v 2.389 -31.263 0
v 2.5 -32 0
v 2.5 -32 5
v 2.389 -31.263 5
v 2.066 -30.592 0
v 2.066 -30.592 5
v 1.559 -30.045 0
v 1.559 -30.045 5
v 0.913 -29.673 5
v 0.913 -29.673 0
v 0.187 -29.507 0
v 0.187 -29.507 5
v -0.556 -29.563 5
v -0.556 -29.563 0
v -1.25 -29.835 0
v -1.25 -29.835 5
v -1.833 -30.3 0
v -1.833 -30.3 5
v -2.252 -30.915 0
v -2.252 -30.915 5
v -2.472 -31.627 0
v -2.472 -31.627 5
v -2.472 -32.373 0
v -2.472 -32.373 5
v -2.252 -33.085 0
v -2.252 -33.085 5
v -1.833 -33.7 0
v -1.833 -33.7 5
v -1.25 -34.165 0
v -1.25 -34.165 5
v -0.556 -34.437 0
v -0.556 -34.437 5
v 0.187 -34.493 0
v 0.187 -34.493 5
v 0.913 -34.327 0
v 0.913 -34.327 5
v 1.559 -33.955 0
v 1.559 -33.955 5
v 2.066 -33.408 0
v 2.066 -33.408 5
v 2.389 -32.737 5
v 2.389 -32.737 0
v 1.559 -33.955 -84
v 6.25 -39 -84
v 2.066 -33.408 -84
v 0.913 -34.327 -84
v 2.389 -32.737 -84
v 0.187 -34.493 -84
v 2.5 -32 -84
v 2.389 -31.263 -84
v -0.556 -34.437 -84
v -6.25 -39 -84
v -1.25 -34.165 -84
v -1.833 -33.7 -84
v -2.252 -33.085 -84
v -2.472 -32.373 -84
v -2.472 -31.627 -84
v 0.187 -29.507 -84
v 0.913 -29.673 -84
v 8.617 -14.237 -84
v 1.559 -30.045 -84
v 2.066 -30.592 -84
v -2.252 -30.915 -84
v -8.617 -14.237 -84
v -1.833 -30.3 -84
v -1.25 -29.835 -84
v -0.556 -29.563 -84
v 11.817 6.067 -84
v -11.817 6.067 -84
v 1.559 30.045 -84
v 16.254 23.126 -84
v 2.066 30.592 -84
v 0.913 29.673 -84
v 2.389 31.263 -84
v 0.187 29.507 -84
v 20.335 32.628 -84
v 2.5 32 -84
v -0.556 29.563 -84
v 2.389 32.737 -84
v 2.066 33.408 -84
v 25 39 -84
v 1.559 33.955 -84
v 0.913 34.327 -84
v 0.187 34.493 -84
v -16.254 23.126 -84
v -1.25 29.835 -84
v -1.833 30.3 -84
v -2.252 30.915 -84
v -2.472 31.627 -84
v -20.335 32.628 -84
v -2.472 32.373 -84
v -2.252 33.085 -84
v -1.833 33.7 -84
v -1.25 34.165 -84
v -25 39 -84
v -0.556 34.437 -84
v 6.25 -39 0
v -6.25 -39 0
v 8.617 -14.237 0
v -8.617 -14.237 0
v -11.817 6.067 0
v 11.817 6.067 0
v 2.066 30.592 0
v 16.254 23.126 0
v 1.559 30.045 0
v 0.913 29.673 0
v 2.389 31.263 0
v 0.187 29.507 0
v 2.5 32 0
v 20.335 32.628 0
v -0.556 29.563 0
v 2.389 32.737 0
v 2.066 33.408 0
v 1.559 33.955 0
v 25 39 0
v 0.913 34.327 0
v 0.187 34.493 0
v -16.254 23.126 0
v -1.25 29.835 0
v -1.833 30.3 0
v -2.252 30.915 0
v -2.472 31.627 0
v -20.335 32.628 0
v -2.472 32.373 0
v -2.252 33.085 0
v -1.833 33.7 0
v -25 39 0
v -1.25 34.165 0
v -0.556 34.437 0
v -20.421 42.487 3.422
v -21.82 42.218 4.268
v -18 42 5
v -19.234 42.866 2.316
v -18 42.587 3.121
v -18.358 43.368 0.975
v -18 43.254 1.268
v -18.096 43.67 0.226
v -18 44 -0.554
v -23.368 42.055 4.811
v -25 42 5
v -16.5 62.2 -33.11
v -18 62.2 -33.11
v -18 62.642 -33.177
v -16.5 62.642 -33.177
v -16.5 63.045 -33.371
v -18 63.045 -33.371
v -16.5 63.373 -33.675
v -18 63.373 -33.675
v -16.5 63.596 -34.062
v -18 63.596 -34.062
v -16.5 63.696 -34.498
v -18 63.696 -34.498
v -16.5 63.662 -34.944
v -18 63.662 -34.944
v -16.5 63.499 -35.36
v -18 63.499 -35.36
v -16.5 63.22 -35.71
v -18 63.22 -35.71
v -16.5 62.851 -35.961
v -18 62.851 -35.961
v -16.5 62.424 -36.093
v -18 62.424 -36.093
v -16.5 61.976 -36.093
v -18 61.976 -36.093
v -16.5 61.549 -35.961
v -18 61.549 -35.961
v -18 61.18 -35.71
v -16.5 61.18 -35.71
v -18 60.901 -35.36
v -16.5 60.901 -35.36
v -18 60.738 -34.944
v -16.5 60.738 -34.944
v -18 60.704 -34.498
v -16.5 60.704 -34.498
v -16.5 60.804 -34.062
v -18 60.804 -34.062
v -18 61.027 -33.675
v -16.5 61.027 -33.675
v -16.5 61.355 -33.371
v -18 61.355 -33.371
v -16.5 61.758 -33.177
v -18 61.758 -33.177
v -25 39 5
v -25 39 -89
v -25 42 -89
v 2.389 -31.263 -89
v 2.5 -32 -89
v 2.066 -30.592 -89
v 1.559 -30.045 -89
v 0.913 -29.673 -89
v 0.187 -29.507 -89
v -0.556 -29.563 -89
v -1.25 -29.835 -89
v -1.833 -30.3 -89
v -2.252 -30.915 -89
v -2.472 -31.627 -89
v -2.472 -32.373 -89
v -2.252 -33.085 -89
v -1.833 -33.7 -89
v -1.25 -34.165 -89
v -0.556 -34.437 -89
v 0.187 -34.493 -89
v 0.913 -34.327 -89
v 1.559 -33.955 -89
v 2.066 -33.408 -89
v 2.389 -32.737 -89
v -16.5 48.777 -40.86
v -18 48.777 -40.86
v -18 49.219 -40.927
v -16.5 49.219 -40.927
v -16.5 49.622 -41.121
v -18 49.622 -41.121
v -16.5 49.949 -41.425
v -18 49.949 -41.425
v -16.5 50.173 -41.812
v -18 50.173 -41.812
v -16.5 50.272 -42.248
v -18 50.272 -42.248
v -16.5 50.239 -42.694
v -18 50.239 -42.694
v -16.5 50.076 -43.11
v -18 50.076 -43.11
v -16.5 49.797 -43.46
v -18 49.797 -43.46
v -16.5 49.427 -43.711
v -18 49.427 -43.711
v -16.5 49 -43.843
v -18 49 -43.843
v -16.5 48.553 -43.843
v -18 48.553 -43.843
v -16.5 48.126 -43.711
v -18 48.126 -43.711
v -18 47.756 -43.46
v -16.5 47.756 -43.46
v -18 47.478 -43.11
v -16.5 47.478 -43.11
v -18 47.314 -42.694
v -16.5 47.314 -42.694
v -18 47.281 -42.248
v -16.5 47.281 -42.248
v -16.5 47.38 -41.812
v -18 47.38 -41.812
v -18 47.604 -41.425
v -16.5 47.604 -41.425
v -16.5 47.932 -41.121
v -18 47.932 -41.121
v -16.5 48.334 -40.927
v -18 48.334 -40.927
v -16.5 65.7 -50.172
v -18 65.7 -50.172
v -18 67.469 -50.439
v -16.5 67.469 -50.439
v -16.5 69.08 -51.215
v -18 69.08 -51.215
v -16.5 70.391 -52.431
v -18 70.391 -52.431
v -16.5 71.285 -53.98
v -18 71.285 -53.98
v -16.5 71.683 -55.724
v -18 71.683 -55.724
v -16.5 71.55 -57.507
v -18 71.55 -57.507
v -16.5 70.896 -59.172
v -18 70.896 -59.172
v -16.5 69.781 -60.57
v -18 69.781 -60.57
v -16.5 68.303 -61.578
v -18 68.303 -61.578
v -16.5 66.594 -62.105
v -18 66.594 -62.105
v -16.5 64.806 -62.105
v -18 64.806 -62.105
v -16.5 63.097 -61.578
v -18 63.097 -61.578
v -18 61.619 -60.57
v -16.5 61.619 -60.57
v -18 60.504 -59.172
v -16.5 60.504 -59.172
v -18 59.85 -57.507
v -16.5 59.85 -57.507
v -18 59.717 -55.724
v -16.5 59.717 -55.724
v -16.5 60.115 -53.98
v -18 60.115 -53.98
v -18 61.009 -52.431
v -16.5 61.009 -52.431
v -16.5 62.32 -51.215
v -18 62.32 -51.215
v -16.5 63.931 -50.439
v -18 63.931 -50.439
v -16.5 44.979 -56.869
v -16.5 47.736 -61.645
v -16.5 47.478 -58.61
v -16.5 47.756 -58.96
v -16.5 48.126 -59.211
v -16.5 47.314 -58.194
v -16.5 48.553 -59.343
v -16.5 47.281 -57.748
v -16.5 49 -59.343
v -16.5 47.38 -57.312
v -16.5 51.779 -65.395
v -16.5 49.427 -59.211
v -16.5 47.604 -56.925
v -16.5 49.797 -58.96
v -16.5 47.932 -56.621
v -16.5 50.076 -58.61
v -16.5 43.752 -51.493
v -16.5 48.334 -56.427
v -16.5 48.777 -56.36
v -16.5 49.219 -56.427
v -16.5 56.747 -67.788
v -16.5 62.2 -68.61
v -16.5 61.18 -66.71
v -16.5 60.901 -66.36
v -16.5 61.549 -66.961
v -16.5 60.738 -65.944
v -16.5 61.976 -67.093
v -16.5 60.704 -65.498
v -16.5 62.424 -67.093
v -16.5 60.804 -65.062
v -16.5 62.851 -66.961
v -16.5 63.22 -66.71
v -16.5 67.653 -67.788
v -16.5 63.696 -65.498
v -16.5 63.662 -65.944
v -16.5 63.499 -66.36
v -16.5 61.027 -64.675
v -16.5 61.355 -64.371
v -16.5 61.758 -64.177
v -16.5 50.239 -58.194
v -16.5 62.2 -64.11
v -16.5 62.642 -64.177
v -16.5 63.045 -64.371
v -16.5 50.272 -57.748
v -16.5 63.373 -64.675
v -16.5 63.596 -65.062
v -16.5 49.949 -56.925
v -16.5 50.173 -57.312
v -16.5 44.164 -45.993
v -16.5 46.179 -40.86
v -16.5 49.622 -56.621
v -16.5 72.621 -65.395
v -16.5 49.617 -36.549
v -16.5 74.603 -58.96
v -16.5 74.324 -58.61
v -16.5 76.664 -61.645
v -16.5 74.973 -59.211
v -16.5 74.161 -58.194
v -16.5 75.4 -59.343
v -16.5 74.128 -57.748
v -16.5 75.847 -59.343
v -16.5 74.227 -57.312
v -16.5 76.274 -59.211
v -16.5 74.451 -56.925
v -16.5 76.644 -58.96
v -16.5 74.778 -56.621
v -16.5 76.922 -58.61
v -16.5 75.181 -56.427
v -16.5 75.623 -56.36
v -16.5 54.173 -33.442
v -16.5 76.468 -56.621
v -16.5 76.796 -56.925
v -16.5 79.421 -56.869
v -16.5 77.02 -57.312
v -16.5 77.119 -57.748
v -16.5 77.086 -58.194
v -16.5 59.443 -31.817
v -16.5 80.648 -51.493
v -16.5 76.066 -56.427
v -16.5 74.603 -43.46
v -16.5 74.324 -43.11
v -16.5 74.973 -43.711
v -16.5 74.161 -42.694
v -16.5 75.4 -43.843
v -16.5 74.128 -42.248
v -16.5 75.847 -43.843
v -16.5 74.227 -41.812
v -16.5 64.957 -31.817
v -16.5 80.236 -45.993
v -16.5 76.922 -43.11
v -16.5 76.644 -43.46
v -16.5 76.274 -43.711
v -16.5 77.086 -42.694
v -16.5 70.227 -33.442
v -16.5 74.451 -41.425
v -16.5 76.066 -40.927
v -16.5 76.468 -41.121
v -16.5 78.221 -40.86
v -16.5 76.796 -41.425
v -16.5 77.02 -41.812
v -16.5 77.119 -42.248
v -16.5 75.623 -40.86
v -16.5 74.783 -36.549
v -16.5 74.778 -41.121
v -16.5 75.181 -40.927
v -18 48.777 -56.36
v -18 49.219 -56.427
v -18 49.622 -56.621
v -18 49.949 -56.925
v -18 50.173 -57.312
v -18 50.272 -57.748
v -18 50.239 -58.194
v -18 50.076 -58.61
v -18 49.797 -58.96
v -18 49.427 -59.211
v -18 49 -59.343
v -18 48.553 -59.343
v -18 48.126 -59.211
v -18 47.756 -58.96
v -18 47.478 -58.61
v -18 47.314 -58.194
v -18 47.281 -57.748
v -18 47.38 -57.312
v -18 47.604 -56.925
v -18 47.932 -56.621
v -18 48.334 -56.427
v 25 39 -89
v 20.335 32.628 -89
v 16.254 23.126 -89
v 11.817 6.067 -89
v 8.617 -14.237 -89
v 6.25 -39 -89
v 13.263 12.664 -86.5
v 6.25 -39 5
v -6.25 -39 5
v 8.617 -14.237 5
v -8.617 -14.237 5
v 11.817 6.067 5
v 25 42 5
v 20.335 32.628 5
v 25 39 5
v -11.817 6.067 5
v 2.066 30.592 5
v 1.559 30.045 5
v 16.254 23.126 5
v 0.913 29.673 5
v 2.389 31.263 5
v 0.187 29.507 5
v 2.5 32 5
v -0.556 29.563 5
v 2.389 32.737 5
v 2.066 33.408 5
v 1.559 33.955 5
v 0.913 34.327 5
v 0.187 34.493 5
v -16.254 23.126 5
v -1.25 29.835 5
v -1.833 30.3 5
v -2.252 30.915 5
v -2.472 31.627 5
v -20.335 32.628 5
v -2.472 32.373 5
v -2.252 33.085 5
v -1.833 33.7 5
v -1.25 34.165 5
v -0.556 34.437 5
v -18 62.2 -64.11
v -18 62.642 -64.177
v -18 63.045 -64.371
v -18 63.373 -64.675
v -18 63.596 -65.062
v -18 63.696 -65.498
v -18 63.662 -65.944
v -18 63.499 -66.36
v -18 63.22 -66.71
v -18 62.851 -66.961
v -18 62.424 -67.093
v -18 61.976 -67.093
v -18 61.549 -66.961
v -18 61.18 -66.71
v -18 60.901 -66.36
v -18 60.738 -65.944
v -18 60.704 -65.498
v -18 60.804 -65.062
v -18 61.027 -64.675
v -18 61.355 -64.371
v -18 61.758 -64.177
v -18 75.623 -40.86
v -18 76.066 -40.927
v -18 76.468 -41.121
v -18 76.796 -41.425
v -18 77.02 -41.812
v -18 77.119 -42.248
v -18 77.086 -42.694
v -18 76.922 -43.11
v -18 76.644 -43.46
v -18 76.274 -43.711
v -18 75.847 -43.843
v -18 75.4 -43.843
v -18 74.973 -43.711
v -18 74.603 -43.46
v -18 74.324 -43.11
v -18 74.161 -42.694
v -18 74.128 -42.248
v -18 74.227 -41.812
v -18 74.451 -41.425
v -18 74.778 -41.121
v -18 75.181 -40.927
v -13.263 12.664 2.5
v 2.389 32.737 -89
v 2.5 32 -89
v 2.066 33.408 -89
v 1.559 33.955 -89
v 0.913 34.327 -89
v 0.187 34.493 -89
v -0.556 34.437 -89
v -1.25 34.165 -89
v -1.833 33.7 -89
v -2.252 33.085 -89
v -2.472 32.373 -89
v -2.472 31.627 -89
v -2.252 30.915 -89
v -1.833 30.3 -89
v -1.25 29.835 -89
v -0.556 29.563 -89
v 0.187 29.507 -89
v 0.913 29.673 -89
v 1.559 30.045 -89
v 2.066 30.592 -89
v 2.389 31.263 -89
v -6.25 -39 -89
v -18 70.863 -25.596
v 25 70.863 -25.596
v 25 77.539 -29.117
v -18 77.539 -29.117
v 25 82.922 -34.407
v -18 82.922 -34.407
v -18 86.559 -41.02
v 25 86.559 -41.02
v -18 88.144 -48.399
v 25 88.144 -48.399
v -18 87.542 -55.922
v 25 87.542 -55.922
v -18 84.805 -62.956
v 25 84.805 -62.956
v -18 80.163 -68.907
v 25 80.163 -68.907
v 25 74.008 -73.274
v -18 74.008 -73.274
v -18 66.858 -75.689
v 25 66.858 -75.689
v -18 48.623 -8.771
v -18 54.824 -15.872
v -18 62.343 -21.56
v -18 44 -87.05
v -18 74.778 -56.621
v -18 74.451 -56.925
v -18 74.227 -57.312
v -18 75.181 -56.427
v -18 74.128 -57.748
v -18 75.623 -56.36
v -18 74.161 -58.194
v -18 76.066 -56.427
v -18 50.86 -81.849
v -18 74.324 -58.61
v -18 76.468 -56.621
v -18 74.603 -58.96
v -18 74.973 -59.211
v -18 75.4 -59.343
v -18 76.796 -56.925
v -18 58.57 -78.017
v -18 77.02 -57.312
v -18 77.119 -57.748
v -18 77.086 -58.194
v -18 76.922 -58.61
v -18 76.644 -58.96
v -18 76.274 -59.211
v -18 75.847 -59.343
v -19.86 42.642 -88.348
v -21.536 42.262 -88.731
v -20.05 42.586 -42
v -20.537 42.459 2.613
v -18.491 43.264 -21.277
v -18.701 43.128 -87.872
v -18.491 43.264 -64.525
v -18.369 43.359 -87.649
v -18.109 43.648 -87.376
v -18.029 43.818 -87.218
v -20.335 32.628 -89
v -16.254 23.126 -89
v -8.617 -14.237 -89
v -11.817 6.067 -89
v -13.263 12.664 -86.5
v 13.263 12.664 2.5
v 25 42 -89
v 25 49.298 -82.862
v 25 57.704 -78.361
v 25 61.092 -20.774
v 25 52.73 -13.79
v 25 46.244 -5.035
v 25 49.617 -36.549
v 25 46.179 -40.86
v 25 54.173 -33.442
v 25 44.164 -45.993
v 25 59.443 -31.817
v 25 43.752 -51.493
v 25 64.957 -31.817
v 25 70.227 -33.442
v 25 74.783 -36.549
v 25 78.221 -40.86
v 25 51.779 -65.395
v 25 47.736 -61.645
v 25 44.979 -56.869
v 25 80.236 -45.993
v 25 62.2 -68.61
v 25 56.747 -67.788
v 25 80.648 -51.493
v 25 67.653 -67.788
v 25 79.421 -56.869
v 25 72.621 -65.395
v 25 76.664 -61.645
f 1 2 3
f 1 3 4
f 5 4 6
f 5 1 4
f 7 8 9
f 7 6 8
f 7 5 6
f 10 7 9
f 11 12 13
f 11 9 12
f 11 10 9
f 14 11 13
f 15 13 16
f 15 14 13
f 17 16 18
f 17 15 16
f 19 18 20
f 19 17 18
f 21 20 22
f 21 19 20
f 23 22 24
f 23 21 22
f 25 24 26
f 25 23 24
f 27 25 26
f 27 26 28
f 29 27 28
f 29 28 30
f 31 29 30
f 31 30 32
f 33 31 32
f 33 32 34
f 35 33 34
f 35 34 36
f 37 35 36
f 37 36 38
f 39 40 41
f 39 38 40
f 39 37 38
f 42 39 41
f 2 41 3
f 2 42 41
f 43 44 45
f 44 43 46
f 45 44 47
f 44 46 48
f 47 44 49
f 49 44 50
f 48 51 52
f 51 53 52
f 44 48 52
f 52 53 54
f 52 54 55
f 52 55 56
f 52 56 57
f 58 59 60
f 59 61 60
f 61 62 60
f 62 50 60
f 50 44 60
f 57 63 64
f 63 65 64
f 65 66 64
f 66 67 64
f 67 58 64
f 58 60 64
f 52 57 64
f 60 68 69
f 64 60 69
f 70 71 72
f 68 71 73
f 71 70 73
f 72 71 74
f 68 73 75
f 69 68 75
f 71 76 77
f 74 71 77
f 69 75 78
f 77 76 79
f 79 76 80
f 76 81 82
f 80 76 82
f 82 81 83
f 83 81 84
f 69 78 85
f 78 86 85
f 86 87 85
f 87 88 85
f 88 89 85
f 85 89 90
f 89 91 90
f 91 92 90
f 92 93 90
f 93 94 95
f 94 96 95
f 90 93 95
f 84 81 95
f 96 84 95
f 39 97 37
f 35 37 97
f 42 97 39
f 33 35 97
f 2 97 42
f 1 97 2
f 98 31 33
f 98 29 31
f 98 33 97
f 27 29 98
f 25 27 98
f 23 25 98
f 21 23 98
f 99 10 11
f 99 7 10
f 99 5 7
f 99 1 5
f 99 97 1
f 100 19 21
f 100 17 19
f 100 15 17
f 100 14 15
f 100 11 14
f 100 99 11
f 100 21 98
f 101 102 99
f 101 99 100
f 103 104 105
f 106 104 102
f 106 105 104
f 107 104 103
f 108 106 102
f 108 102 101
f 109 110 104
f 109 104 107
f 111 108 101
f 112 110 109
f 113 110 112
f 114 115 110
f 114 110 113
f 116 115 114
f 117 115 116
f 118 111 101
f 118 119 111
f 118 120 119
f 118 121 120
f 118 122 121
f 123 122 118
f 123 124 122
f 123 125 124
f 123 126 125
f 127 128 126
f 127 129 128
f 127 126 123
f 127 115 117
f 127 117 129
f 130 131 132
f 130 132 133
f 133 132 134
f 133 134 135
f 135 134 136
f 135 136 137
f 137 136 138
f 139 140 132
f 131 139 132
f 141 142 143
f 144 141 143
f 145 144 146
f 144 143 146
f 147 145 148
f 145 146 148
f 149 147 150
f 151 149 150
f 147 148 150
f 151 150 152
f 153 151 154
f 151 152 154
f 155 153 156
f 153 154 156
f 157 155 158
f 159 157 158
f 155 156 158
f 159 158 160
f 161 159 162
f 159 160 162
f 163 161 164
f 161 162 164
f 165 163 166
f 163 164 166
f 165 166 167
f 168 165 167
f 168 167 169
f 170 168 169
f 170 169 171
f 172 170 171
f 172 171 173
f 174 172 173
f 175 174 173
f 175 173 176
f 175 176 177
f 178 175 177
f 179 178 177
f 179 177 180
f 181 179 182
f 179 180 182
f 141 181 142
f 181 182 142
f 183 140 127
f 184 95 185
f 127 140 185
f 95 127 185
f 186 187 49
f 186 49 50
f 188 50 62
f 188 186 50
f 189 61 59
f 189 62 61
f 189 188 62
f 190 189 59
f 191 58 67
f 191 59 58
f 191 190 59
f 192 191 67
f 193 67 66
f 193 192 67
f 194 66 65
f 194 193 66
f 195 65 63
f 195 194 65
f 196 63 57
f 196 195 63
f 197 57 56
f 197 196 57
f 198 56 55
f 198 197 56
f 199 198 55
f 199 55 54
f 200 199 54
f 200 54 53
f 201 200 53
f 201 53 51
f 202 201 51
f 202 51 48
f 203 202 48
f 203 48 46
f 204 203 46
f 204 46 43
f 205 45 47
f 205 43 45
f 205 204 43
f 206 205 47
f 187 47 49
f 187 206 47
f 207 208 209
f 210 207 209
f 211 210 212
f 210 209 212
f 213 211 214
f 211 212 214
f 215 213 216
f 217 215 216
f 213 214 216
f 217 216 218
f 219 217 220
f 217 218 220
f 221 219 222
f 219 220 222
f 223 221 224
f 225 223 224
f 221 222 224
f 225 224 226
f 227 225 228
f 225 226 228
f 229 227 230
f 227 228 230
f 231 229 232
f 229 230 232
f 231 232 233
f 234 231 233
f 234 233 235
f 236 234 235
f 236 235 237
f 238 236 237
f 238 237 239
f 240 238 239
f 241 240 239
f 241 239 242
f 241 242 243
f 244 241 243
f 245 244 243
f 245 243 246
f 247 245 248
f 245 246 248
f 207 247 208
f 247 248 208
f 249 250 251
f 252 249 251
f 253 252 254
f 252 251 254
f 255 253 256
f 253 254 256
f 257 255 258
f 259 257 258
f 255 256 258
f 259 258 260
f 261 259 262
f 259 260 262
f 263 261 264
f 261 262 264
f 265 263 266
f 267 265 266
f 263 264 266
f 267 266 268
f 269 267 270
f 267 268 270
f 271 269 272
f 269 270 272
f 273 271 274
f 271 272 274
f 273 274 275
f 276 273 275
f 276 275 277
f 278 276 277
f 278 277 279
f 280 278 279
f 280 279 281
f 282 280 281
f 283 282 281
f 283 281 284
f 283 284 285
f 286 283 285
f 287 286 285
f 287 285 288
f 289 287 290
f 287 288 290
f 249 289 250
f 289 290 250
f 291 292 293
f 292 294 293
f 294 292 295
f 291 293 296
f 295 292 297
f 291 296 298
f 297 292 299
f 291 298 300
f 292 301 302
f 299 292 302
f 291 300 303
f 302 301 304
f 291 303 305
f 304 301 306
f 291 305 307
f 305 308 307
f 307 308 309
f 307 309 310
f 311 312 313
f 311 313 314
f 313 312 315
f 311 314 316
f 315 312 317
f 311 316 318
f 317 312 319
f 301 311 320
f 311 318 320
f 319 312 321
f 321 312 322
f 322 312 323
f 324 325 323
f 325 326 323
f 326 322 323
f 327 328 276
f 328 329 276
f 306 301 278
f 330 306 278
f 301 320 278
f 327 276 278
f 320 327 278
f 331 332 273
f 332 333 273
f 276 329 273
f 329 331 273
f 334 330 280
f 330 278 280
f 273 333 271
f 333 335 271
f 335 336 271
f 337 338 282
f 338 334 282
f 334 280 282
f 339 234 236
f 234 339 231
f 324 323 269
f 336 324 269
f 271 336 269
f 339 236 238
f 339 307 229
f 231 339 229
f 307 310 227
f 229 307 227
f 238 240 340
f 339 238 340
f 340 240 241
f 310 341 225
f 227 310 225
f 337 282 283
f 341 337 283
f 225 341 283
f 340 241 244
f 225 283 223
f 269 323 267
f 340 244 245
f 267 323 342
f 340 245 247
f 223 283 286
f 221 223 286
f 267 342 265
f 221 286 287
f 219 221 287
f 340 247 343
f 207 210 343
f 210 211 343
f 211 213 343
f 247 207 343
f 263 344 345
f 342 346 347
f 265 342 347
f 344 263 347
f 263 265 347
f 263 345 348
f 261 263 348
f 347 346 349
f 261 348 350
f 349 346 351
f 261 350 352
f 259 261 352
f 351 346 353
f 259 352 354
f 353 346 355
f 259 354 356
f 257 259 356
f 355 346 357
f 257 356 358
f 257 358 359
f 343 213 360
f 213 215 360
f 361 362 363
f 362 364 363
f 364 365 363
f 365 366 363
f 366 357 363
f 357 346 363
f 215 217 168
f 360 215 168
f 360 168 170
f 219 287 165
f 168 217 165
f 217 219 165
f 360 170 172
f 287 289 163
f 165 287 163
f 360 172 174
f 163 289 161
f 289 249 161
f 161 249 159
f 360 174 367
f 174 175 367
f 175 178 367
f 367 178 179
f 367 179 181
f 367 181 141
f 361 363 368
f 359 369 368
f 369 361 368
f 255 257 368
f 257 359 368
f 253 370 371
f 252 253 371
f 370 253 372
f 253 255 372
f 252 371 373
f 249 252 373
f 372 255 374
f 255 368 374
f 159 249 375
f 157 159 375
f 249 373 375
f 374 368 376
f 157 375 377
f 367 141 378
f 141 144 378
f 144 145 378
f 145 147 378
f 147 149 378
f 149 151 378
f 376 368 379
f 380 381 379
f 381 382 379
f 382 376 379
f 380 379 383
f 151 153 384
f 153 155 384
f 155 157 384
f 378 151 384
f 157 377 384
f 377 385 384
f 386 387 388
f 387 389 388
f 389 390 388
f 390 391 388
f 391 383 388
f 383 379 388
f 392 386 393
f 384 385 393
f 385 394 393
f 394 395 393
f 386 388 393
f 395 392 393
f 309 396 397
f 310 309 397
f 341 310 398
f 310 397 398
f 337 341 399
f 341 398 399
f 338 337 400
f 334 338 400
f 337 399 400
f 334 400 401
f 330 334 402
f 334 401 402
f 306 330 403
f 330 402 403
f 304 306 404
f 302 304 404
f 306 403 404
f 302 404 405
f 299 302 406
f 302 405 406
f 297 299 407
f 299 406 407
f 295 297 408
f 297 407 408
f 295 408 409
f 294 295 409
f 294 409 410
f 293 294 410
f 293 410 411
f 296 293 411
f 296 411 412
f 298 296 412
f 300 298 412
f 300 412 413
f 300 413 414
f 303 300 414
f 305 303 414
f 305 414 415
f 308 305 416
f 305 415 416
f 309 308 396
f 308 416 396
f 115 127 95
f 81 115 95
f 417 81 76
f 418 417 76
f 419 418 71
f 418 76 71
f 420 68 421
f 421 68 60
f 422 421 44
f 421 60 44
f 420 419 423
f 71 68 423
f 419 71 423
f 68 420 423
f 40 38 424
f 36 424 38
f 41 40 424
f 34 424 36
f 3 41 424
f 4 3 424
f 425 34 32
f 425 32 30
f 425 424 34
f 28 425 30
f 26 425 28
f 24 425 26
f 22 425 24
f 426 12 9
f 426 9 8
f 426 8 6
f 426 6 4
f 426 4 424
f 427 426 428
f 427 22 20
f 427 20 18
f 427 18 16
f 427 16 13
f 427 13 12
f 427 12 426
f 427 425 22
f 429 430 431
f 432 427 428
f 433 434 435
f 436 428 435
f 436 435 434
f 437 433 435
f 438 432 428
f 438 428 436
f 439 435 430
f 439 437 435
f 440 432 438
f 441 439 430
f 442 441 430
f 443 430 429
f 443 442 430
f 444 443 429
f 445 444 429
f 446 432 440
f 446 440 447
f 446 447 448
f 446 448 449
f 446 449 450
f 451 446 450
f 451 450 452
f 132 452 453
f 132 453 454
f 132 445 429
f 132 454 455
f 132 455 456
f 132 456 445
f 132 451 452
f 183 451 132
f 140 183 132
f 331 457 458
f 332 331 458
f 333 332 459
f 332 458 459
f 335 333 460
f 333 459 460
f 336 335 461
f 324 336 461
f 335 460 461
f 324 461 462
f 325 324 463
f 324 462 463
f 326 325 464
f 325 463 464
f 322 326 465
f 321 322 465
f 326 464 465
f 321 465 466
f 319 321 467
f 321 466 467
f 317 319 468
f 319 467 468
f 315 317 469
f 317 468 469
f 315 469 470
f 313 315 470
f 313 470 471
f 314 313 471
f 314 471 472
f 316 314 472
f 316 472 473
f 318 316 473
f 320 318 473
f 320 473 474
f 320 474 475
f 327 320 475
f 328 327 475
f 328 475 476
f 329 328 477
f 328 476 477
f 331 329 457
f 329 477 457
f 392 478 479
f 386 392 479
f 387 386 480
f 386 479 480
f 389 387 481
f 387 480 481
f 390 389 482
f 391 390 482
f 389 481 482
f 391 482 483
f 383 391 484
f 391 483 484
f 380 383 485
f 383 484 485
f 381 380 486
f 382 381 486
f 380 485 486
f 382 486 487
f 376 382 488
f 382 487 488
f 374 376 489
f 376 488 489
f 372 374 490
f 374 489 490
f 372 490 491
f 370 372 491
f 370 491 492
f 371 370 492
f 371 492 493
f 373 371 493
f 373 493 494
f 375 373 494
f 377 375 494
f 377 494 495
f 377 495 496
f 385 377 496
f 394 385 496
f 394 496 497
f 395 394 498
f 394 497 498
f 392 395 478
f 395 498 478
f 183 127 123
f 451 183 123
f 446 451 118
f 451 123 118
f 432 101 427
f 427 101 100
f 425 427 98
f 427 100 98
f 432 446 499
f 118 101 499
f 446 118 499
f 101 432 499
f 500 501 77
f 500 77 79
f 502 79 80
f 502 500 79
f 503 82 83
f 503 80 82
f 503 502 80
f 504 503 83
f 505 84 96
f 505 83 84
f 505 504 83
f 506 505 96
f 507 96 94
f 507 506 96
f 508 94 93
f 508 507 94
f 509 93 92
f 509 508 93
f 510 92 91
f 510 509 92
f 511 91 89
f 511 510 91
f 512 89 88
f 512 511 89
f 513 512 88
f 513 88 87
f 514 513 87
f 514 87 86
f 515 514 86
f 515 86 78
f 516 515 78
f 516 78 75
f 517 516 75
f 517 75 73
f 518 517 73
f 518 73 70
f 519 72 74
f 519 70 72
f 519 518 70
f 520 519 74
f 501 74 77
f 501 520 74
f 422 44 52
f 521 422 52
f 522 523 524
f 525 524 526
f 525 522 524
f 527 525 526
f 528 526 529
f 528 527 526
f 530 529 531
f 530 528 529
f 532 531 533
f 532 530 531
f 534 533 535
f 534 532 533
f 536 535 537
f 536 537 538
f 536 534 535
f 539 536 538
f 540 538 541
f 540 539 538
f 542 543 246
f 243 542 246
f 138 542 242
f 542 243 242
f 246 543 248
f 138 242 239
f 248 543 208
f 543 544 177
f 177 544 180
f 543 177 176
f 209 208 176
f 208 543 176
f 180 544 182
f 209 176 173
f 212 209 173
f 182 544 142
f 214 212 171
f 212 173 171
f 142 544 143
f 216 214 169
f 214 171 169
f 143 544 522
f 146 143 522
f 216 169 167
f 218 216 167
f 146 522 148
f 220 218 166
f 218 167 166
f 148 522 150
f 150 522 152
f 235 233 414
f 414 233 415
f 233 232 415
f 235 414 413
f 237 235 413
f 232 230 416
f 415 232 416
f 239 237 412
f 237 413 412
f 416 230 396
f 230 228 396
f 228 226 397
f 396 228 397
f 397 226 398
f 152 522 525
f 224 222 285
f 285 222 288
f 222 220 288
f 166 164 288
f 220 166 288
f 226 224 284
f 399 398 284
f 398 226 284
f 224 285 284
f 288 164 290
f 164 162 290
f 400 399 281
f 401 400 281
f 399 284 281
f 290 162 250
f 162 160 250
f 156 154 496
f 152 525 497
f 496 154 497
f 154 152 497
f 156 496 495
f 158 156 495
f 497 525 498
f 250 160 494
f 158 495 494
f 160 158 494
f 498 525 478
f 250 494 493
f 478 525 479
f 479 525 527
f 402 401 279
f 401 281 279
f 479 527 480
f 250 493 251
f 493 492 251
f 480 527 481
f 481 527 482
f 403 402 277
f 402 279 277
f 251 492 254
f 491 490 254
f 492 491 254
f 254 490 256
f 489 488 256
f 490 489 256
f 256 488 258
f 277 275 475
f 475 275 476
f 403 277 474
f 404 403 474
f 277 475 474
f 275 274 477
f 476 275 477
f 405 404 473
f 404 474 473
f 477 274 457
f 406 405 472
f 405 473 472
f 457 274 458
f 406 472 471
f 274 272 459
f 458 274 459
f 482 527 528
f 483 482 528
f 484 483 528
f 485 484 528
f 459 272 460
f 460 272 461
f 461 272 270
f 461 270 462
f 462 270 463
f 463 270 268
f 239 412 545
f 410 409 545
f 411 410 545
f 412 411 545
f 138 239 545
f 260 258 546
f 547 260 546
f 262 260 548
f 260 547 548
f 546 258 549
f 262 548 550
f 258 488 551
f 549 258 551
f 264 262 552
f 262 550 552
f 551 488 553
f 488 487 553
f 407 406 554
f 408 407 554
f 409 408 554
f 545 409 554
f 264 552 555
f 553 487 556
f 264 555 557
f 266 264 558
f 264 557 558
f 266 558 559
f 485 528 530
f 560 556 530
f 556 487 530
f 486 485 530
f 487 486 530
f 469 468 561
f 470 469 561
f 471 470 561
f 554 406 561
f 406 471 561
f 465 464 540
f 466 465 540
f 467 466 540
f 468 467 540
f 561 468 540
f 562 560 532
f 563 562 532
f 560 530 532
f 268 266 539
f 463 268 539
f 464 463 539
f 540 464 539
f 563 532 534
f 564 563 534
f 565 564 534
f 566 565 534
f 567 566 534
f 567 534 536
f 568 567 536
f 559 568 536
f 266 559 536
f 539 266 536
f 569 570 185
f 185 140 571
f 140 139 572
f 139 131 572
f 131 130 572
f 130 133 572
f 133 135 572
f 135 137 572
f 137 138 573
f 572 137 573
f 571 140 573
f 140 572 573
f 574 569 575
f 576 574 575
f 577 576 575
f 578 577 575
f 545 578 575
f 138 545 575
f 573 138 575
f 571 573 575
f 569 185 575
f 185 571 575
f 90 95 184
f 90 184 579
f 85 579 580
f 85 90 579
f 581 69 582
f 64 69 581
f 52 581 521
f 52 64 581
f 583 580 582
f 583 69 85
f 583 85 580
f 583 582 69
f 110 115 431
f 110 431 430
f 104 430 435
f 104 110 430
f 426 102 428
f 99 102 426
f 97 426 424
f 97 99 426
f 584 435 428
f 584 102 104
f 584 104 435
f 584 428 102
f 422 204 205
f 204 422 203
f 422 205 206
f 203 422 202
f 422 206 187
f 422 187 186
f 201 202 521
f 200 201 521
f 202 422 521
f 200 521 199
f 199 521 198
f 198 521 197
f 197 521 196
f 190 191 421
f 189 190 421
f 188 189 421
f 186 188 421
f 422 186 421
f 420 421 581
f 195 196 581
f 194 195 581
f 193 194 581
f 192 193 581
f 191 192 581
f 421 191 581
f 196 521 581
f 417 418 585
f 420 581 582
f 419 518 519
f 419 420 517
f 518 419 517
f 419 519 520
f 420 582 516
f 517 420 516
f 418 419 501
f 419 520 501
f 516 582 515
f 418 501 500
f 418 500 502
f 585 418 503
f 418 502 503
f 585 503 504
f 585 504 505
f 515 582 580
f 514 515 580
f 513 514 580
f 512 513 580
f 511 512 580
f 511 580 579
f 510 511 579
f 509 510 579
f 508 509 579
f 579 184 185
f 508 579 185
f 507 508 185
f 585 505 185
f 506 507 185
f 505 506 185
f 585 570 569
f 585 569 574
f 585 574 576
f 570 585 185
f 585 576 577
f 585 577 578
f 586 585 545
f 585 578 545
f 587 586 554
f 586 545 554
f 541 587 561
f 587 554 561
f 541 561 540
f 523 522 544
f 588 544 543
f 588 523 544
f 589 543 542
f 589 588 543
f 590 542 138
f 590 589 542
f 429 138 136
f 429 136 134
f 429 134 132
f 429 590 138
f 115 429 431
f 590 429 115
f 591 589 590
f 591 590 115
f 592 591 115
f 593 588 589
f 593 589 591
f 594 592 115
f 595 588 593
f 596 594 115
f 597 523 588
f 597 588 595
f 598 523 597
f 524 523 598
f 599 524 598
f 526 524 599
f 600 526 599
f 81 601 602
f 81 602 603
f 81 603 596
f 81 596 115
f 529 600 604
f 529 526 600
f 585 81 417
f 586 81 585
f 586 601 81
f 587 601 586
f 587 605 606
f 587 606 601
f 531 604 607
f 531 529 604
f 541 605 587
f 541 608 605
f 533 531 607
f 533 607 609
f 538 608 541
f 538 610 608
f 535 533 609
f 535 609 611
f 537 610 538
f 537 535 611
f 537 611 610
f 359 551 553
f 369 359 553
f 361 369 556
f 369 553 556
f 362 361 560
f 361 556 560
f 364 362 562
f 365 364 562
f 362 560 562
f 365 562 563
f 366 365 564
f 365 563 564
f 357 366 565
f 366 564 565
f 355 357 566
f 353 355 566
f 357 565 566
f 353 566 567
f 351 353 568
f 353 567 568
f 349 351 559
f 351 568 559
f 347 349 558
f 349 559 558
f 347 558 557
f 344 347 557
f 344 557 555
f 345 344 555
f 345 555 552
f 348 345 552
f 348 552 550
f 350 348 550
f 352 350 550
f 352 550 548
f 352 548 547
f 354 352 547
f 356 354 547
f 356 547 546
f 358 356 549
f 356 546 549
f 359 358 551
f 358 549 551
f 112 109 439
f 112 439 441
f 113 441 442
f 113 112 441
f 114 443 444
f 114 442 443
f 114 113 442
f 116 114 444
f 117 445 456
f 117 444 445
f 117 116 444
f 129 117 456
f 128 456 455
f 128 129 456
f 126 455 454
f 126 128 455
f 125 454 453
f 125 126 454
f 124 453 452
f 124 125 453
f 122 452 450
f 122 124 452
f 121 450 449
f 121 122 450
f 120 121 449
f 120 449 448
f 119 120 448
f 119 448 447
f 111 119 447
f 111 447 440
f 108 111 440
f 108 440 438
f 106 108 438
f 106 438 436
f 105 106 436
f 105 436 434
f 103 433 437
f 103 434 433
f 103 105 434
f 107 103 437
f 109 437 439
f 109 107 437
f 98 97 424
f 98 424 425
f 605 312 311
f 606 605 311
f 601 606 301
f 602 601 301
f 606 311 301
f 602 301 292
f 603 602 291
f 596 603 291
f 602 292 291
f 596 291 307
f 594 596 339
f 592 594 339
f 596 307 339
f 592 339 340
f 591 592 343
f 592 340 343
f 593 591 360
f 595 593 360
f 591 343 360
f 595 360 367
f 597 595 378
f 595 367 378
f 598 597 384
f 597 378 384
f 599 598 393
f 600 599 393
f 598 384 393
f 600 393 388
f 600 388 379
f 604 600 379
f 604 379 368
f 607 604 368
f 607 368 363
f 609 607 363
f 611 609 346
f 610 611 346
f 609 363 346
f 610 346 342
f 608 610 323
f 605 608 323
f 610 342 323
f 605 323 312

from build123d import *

# Parameters (mm, degrees)
BOSS_EXTRUDE1_DEPTH      = 5
BOSS_EXTRUDE2_START      = -84
BOSS_EXTRUDE2_DEPTH      = 5
BOSS_EXTRUDE7_DEPTH      = 21
BOSS_EXTRUDE7_DEPTH_BACK = 29
BOSS_EXTRUDE7_START      = 4
SKETCH9_W                = 94
SKETCH9_H                = 3
CUT_EXTRUDE1_DEPTH       = 106.948100654
CUT_EXTRUDE1_DEPTH_BACK  = 106.948100654
SKETCH5_R                = 2.5
BOSS_EXTRUDE9_START      = -8.5
SKETCH13_R               = 18.5
BOSS_EXTRUDE9_DEPTH      = 41.5
BOSS_EXTRUDE10_START     = 1.5
SKETCH15_R               = 1.5
SKETCH15_R_2             = 6
BOSS_EXTRUDE10_DEPTH     = 1.5
FILLET2_R                = 46
FILLET4_SIZE             = 2
FILLET4_SIZE_2           = 7


with BuildPart() as part:
    # Sketch2 → Boss-Extrude1 (new body)
    with BuildSketch(Plane.XY):
        with BuildLine():
            Line((6.25, -39), (-6.25, -39))
            add(Edge.make_bspline(
                [(-25, 39), (-10.900418278, 25.328341358), (-6.25, -39)],
                knots=[0, 0, 0, 1, 1, 1], degree=2))
            Line((-25, 39), (25, 39))
            add(Edge.make_bspline(
                [(25, 39), (10.900418278, 25.328341358), (6.25, -39)],
                knots=[0, 0, 0, 1, 1, 1], degree=2))
        make_face()
    extrude(amount=BOSS_EXTRUDE1_DEPTH)



with BuildPart() as body_2:
    # Sketch3 → Boss-Extrude2 (new body)
    with BuildSketch(Plane.XY.offset(BOSS_EXTRUDE2_START)):
        with BuildLine():
            Line((6.25, -39), (-6.25, -39))
            add(Edge.make_bspline(
                [(-25, 39), (-10.900418278, 25.328341358), (-6.25, -39)],
                knots=[0, 0, 0, 1, 1, 1], degree=2))
            Line((-25, 39), (25, 39))
            add(Edge.make_bspline(
                [(25, 39), (10.900418278, 25.328341358), (6.25, -39)],
                knots=[0, 0, 0, 1, 1, 1], degree=2))
        make_face()
    extrude(amount=-BOSS_EXTRUDE2_DEPTH)


with BuildPart() as part_1:
    add(part.part)

    add(body_2.part)  # Boss-Extrude7 merges body 2
    # Sketch9 → Boss-Extrude7 (add, two sides: drawn at the far end of the back side and taken through both)
    with BuildSketch(Plane(origin=(0, 0, 0), x_dir=(0, 0, -1), z_dir=(1, 0, 0)).offset(BOSS_EXTRUDE7_START - BOSS_EXTRUDE7_DEPTH_BACK)):
        with Locations((42, 40.5)):
            Rectangle(SKETCH9_W, SKETCH9_H)
    extrude(amount=BOSS_EXTRUDE7_DEPTH + BOSS_EXTRUDE7_DEPTH_BACK)

    # Sketch5 → Cut-Extrude1 (cut, two sides: drawn at the far end of the back side and taken through both)
    with BuildSketch(Plane.XY.offset(5).offset(-CUT_EXTRUDE1_DEPTH_BACK)):
        with Locations((0, 32)):
            Circle(SKETCH5_R)
        with Locations((0, -32)):
            Circle(SKETCH5_R)
    extrude(amount=CUT_EXTRUDE1_DEPTH + CUT_EXTRUDE1_DEPTH_BACK, mode=Mode.SUBTRACT)

    # Sketch13 → Boss-Extrude9 (add)
    with BuildSketch(Plane.ZY.offset(25).offset(BOSS_EXTRUDE9_START)):
        with BuildLine():
            Line((-66.479483804, 42), (-33.740516196, 42))
            ThreePointArc((-33.740516196, 42), (-50.11, 88.2), (-66.479483804, 42))
        make_face()
        with Locations(Location((-50.11, 62.2, 0), (0, 0, 180))):
            Circle(SKETCH13_R, mode=Mode.SUBTRACT)
    extrude(amount=-BOSS_EXTRUDE9_DEPTH)

    # Sketch15 → Boss-Extrude10 (add)
    with BuildSketch(Plane.ZY.offset(16.5).offset(BOSS_EXTRUDE10_START)):
        with BuildLine():
            Line((-66.479483804, 42), (-33.740516196, 42))
            ThreePointArc((-33.740516196, 42), (-50.11, 88.2), (-66.479483804, 42))
        make_face()
        with Locations((-34.61, 62.2)):
            Circle(SKETCH15_R, mode=Mode.SUBTRACT)
        with Locations((-42.36, 48.776606241)):
            Circle(SKETCH15_R, mode=Mode.SUBTRACT)
        with Locations((-57.86, 48.776606241)):
            Circle(SKETCH15_R, mode=Mode.SUBTRACT)
        with Locations((-65.61, 62.2)):
            Circle(SKETCH15_R, mode=Mode.SUBTRACT)
        with Locations((-57.86, 75.623393759)):
            Circle(SKETCH15_R, mode=Mode.SUBTRACT)
        with Locations((-42.36, 75.623393759)):
            Circle(SKETCH15_R, mode=Mode.SUBTRACT)
        with Locations((-56.172177826, 65.7)):
            Circle(SKETCH15_R_2, mode=Mode.SUBTRACT)
    extrude(amount=-BOSS_EXTRUDE10_DEPTH)

    # Fillet2
    # the kernel refuses this fillet: 46 mm, written as the material it adds along each edge
    with BuildSketch(Plane(origin=(-18, 42, -66.479483804), x_dir=(0, 0, -1), z_dir=(1, 0, 0))) as fillet2_piece_1:
        with BuildLine():
            CenterArc((54.465764785, 33.098354832), FILLET2_R, 190.319893555, 35.695751296)
            Line((9.20991152, 24.857739245), (8.304794455, 24.692926933))
            ThreePointArc((8.304794455, 24.692926933), (7.148225336, 11.486576056), (-0.579227888, 0.714769231))
            Line((-0.579227888, 0.714769231), (0, -0.92))
            ThreePointArc((0, -0.92), (11.260258098, -0.92), (21.881611225, -0.661967097))
            Line((21.881611225, -0.661967097), (22.520516196, 0))
        make_face()
    extrude(amount=43)
    with BuildSketch(Plane(origin=(25, 42, -33.740516196), x_dir=(0, 0, 1), z_dir=(-1, 0, 0))) as fillet2_piece_2:
        with BuildLine():
            CenterArc((51.516198575, 44.19029237), FILLET2_R, 199.46302715, 54.412069486)
            Line((8.144790389, 28.863161134), (7.277362225, 28.556618509))
            ThreePointArc((7.277362225, 28.556618509), (7.767902037, 13.388758941), (-0.579227888, 0.714769231))
            Line((-0.579227888, 0.714769231), (0, -0.92))
            ThreePointArc((0, -0.92), (19.370258098, -0.92), (38.485002549, -0.883805847))
            Line((38.485002549, -0.883805847), (38.740516196, 0))
        make_face()
    extrude(amount=43)

    # Fillet4
    # an asymmetric fillet: 7, 2 mm, written as the material it adds along each edge
    with BuildSketch(Plane(origin=(-18, 42, -89), x_dir=(0, 1, 0), z_dir=(0, 0, 1))) as fillet4_piece_1_section:
        with BuildLine():
            Bezier((FILLET4_SIZE, 0), (0, 0), (0, FILLET4_SIZE_2), weights=[1, 0.707106781, 1])
            Line((0, FILLET4_SIZE_2), (0, 0))
            Line((0, 0), (FILLET4_SIZE, 0))
        make_face()
    fillet4_piece_1 = extrude(amount=94, mode=Mode.PRIVATE)
    fillet4_piece_1 = fillet4_piece_1 - Plane(origin=(-19.911254264, 86.19029237, 17.775682378), x_dir=(0, 0, 1), z_dir=(1, 0, 0)) * Cylinder(46, 216, mode=Mode.PRIVATE)
    fillet4_piece_1 = fillet4_piece_1 - Plane(origin=(-19.911254264, 75.098354832, -120.945248589), x_dir=(0, 0, -1), z_dir=(-1, 0, 0)) * Cylinder(46, 216, mode=Mode.PRIVATE)
    add(fillet4_piece_1)


solid = part_1.part
